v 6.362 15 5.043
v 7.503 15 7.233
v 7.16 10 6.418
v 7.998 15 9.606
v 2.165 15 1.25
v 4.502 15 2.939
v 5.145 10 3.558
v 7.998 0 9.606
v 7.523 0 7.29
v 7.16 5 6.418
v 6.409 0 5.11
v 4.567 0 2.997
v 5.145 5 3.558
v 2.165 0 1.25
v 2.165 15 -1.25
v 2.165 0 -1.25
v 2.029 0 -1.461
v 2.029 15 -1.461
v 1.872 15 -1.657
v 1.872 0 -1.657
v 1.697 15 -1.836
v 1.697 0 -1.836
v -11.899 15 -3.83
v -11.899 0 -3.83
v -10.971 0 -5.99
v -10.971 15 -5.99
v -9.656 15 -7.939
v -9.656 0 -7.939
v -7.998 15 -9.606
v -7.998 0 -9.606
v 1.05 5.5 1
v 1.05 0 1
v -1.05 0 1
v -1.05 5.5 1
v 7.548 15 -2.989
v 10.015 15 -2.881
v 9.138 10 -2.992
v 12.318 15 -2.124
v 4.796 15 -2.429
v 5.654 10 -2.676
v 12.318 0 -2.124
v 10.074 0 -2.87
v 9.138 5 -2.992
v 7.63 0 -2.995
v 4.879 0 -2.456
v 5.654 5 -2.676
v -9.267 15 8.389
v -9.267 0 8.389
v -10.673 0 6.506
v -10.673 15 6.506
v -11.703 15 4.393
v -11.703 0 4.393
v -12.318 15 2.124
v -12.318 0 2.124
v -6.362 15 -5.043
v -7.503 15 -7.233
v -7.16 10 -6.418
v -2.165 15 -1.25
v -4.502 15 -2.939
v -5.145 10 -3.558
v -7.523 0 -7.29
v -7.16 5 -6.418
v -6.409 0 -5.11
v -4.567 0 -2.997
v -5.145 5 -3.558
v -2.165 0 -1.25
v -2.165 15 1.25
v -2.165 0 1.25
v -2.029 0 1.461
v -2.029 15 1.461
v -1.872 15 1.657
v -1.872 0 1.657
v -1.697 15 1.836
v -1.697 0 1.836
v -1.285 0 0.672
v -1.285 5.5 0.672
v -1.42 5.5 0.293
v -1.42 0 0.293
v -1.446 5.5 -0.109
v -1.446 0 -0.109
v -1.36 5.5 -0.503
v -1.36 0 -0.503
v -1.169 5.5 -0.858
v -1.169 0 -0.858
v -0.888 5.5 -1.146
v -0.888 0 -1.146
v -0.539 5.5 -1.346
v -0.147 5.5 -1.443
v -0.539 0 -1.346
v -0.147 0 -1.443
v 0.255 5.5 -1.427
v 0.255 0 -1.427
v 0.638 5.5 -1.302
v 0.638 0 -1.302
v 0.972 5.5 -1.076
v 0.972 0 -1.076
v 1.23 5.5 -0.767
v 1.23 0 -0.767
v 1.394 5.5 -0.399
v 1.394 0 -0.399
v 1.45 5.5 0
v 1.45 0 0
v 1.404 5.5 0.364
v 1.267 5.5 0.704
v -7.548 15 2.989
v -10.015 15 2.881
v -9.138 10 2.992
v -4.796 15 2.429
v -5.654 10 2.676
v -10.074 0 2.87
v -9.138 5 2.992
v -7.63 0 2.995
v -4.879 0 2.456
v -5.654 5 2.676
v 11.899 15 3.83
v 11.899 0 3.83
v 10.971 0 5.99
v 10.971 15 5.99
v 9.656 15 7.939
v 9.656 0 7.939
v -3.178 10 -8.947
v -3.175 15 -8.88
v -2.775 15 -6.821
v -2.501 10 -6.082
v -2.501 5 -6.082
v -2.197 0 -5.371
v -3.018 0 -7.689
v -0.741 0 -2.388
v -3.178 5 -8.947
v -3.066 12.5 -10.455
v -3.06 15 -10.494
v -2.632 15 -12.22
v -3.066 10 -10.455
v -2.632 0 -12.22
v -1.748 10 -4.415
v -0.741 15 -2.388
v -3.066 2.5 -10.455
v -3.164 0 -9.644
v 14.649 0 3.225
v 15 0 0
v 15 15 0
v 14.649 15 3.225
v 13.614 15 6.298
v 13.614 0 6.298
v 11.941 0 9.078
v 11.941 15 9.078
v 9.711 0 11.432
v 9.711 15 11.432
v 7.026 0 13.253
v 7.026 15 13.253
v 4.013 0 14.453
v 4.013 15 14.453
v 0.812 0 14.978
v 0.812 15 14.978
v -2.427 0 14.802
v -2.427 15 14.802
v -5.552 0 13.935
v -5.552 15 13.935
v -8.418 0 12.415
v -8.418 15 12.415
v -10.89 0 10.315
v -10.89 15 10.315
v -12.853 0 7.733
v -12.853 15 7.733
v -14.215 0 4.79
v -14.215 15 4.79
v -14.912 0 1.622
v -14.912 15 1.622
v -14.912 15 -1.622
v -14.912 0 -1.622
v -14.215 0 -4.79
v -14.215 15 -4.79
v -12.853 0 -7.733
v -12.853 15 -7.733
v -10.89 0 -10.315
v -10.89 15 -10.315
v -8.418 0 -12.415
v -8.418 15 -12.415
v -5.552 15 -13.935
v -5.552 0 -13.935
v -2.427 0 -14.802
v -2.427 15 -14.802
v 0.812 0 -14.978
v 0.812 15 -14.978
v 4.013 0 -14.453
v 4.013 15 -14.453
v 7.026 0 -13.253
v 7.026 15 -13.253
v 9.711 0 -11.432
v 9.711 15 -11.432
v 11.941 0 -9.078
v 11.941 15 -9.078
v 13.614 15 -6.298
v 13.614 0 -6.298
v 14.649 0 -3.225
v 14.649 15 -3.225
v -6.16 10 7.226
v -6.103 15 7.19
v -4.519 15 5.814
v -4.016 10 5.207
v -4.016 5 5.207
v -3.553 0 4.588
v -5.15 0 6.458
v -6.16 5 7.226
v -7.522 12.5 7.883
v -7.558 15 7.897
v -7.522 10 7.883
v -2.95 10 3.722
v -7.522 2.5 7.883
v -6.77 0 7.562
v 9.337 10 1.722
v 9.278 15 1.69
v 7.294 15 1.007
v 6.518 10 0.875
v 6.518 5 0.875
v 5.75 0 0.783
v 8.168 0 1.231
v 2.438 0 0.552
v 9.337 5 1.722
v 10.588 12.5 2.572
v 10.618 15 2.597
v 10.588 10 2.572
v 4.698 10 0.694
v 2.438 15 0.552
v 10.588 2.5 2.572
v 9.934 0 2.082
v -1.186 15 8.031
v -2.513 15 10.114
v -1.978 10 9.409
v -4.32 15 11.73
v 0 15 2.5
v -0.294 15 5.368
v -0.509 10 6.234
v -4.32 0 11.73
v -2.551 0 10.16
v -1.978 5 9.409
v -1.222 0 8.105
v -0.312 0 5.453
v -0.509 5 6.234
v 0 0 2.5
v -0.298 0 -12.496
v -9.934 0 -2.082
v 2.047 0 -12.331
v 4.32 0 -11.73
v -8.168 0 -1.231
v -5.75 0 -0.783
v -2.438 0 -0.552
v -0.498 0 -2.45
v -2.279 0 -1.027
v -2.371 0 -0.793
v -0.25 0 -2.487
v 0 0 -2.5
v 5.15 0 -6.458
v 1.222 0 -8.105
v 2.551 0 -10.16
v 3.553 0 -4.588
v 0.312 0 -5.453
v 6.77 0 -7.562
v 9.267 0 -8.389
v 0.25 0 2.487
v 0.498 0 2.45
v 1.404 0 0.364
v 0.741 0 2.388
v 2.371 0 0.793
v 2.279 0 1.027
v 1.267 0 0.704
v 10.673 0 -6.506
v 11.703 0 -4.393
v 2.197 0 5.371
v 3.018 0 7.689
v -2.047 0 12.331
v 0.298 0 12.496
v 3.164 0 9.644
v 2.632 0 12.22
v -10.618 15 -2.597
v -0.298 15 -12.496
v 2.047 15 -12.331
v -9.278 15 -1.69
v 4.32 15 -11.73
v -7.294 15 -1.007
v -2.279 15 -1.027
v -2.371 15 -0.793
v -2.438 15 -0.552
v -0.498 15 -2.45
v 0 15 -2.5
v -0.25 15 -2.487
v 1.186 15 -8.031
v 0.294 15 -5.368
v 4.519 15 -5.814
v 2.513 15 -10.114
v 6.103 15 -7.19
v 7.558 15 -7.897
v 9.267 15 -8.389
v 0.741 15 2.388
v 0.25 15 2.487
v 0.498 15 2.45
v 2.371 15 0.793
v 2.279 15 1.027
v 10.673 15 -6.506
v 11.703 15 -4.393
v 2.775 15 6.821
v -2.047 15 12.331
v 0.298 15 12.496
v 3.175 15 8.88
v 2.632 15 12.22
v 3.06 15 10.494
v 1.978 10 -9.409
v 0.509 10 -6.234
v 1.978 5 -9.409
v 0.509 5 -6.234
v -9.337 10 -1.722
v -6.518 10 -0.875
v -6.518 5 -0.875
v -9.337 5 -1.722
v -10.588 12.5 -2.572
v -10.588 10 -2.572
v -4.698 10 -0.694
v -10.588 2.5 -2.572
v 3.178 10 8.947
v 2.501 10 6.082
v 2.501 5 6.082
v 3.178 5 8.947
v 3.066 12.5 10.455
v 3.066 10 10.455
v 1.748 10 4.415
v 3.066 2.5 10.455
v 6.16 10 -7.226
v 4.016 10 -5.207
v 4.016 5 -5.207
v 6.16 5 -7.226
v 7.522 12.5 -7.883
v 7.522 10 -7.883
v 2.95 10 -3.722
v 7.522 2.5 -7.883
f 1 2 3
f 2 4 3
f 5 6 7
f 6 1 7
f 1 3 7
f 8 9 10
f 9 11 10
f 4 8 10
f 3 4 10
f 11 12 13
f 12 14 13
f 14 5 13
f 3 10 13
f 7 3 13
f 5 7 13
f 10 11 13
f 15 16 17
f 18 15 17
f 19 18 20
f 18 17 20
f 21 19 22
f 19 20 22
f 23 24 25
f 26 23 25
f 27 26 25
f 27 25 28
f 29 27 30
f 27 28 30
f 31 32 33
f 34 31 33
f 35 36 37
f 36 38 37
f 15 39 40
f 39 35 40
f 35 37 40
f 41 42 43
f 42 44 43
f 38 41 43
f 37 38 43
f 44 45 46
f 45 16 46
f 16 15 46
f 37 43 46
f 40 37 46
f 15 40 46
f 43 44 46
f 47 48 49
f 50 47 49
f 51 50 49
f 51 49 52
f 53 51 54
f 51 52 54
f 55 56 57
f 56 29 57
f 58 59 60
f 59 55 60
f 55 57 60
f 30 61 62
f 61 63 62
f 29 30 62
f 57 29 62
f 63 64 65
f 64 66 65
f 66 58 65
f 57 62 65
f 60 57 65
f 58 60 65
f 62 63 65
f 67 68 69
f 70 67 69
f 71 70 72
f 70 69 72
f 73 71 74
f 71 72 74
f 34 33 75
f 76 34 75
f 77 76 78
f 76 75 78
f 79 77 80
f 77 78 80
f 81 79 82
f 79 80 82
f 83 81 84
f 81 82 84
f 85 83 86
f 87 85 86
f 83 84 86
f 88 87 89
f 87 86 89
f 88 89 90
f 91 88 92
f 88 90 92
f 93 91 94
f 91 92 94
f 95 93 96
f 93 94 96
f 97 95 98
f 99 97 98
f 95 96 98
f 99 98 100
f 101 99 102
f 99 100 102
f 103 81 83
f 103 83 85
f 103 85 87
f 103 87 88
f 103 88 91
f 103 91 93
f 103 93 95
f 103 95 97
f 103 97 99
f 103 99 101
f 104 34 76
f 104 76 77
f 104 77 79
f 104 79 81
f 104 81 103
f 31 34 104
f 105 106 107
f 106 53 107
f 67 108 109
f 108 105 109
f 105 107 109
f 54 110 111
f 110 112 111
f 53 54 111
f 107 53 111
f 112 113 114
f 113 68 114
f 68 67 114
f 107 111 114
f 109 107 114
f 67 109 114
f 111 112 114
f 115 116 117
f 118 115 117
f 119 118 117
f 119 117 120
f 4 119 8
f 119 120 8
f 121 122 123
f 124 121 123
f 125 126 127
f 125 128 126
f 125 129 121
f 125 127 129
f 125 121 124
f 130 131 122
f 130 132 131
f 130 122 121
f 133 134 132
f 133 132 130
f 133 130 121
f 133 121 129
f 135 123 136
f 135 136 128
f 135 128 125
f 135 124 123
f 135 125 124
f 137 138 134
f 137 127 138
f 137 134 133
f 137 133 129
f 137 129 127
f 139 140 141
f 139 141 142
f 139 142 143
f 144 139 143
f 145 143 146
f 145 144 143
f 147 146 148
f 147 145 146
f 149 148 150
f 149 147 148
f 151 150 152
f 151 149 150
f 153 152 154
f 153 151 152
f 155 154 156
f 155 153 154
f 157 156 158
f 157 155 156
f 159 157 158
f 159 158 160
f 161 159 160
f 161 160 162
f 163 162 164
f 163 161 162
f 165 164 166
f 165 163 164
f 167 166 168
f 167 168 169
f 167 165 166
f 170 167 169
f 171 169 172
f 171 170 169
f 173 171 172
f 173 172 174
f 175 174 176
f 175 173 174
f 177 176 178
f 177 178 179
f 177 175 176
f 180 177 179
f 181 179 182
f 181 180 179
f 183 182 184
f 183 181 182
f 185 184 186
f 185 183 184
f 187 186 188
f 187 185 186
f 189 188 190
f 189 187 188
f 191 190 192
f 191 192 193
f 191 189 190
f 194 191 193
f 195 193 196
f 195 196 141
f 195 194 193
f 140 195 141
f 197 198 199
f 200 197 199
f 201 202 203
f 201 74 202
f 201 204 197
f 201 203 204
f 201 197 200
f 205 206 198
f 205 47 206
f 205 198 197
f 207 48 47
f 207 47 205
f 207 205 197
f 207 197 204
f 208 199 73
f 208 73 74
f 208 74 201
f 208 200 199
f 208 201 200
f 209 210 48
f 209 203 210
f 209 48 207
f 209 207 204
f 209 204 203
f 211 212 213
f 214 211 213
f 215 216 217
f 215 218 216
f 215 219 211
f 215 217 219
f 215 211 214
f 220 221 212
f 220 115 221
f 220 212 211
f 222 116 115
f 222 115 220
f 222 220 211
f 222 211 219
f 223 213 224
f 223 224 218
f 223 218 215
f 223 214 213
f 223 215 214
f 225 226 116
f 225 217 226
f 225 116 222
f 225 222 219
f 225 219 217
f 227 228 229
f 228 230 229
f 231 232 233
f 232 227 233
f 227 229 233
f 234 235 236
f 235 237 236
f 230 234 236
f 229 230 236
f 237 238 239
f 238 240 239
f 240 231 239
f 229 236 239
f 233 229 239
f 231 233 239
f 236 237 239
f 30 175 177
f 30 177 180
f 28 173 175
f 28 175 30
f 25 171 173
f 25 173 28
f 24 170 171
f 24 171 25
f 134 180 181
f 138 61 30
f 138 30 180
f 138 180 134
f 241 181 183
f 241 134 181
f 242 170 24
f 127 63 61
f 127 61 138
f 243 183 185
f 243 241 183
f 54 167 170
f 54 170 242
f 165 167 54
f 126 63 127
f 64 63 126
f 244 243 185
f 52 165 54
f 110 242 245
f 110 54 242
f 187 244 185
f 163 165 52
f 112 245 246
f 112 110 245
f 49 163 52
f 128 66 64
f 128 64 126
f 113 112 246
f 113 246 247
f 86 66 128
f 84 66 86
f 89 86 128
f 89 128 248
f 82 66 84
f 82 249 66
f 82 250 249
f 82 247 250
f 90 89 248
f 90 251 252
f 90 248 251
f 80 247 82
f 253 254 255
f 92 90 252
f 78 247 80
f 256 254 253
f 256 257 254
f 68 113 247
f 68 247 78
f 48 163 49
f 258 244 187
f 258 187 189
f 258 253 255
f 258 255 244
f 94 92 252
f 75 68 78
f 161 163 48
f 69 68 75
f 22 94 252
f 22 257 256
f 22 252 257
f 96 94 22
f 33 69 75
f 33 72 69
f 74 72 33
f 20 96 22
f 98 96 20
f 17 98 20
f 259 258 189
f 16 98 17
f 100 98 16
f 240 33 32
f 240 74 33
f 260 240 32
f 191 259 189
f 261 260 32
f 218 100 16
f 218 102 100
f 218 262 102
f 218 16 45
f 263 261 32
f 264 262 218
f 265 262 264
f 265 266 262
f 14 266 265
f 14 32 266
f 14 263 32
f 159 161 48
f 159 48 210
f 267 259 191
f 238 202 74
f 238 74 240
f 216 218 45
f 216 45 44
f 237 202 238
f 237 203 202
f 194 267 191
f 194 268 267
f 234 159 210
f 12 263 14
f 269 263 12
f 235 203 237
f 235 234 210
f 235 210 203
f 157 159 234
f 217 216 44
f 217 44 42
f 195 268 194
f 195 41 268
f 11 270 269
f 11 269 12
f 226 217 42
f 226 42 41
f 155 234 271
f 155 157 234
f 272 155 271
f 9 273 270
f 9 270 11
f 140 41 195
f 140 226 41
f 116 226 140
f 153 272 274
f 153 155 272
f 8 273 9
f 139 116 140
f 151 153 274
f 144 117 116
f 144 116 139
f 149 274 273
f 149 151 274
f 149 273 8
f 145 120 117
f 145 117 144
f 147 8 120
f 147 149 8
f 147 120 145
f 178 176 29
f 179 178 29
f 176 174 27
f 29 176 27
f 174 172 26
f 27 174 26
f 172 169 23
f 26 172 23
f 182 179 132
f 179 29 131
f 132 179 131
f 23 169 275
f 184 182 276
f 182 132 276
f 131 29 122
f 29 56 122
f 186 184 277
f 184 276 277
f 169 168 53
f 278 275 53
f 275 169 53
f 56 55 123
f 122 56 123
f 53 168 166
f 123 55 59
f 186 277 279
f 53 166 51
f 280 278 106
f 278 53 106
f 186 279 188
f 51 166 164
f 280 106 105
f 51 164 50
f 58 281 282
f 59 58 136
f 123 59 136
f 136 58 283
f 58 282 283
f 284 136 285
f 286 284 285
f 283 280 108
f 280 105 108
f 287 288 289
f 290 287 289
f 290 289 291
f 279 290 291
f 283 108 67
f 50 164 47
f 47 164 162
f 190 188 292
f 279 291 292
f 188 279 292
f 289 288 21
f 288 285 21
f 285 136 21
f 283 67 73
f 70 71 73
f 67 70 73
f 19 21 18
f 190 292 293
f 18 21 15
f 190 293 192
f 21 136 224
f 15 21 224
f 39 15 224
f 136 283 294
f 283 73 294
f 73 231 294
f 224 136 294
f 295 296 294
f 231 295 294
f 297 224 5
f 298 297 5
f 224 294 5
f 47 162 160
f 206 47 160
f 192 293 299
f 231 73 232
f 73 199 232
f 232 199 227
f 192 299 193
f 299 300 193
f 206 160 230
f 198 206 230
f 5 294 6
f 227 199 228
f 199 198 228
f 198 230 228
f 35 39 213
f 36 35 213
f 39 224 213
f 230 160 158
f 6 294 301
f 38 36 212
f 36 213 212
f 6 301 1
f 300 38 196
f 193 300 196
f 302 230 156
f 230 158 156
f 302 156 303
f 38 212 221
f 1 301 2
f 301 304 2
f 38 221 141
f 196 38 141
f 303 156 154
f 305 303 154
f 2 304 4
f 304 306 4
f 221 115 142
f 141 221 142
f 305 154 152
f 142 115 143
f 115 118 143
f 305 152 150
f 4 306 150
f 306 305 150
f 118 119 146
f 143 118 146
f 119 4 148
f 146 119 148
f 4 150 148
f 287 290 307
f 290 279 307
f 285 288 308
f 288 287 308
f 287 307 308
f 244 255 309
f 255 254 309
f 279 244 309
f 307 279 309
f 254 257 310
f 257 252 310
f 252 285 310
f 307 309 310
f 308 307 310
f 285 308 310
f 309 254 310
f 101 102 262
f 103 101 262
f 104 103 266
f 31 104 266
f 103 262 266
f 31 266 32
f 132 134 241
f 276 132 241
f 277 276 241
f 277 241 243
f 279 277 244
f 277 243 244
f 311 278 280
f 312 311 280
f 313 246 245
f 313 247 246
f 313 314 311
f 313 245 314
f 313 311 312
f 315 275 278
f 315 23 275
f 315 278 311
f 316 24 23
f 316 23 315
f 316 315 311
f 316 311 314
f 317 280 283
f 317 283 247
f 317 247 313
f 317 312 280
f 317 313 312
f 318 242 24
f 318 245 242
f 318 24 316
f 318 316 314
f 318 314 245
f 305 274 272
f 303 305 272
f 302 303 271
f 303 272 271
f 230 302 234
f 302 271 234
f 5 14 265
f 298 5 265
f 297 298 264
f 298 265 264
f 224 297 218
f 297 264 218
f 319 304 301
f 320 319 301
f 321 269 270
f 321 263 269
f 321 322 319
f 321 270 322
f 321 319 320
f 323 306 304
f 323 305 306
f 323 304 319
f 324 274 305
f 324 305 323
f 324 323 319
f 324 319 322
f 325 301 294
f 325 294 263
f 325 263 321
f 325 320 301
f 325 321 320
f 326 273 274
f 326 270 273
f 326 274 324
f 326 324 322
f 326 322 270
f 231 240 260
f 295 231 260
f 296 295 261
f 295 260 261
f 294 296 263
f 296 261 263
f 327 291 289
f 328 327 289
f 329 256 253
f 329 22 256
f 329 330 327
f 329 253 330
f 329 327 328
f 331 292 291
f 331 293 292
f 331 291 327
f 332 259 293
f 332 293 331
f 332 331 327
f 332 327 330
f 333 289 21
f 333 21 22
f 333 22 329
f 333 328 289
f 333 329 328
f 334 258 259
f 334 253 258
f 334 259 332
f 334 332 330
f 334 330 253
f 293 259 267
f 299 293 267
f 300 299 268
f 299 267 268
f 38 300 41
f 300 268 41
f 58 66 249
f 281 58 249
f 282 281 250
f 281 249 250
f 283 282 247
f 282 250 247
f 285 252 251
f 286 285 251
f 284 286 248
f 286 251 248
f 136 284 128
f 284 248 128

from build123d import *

# Parameters (mm, degrees)
F0_R            = 15
F1_DEPTH        = 15
F3_DEPTH        = 5.5
F5_DEPTH        = 15.001
F5_COPIES_COUNT = 6


# Not quite as in the source:
# - a pattern or mirror of a feature is missing from the dataset's text; its kind, count and spacing are read off the source's solid


with BuildPart() as f1:
    # F0 (on Front) → F1 (new body)
    with BuildSketch(Plane.XZ):
        Circle(F0_R)
    extrude(amount=-F1_DEPTH)

    # F2 (on face) → F3 (cut)
    with BuildSketch(Plane.XZ):
        with BuildLine():
            ThreePointArc((-1.0499999991, 1.000000001), (-0.5385164813, -1.3462912015), (1.45, 0))
            ThreePointArc((1.45, 0), (1.3462912015, 0.5385164813), (1.0499999991, 1.000000001))
            Line((1.0499999991, 1.000000001), (-1.0499999991, 1.000000001))
        make_face()
    extrude(amount=-F3_DEPTH, mode=Mode.SUBTRACT)

    # F4 (on face) → F5 (cut, through all)
    with BuildSketch(Plane.XZ):
        with BuildLine():
            ThreePointArc((2.6320639833, 12.2197479183), (-0.8786691083, 12.4690793805), (-4.3197418021, 11.7298691708))
            add(Edge.make_bspline(
                [(-4.3197418021, 11.7298691708), (-1.5711041633, 9.9351070821), (0, 6.4156376757), (0, 2.5)],
                knots=[0, 0, 0, 0, 10.1907141136, 10.1907141136, 10.1907141136, 10.1907141136], degree=3))
            ThreePointArc((0, 2.5), (0.3749457354, 2.4717232239), (0.7414096655, 2.3875325564))
            add(Edge.make_bspline(
                [(2.6320639833, 12.2197479183), (3.8345751818, 8.3321332932), (2.9968102463, 6.907931529), (0.7414096655, 2.3875325564)],
                knots=[0, 0, 0, 0, 10.0123440149, 10.0123440149, 10.0123440149, 10.0123440149], degree=3))
        make_face()
    f5 = extrude(amount=-F5_DEPTH, mode=Mode.SUBTRACT)

    # F5_copies: F5 ×6 about axis
    f5_copies_axis = Axis((0, 0, 0), (0, 1, 0))
    for i in range(1, F5_COPIES_COUNT):
        add(f5.rotate(f5_copies_axis, i * 360 / F5_COPIES_COUNT), mode=Mode.SUBTRACT)


solid = f1.part
